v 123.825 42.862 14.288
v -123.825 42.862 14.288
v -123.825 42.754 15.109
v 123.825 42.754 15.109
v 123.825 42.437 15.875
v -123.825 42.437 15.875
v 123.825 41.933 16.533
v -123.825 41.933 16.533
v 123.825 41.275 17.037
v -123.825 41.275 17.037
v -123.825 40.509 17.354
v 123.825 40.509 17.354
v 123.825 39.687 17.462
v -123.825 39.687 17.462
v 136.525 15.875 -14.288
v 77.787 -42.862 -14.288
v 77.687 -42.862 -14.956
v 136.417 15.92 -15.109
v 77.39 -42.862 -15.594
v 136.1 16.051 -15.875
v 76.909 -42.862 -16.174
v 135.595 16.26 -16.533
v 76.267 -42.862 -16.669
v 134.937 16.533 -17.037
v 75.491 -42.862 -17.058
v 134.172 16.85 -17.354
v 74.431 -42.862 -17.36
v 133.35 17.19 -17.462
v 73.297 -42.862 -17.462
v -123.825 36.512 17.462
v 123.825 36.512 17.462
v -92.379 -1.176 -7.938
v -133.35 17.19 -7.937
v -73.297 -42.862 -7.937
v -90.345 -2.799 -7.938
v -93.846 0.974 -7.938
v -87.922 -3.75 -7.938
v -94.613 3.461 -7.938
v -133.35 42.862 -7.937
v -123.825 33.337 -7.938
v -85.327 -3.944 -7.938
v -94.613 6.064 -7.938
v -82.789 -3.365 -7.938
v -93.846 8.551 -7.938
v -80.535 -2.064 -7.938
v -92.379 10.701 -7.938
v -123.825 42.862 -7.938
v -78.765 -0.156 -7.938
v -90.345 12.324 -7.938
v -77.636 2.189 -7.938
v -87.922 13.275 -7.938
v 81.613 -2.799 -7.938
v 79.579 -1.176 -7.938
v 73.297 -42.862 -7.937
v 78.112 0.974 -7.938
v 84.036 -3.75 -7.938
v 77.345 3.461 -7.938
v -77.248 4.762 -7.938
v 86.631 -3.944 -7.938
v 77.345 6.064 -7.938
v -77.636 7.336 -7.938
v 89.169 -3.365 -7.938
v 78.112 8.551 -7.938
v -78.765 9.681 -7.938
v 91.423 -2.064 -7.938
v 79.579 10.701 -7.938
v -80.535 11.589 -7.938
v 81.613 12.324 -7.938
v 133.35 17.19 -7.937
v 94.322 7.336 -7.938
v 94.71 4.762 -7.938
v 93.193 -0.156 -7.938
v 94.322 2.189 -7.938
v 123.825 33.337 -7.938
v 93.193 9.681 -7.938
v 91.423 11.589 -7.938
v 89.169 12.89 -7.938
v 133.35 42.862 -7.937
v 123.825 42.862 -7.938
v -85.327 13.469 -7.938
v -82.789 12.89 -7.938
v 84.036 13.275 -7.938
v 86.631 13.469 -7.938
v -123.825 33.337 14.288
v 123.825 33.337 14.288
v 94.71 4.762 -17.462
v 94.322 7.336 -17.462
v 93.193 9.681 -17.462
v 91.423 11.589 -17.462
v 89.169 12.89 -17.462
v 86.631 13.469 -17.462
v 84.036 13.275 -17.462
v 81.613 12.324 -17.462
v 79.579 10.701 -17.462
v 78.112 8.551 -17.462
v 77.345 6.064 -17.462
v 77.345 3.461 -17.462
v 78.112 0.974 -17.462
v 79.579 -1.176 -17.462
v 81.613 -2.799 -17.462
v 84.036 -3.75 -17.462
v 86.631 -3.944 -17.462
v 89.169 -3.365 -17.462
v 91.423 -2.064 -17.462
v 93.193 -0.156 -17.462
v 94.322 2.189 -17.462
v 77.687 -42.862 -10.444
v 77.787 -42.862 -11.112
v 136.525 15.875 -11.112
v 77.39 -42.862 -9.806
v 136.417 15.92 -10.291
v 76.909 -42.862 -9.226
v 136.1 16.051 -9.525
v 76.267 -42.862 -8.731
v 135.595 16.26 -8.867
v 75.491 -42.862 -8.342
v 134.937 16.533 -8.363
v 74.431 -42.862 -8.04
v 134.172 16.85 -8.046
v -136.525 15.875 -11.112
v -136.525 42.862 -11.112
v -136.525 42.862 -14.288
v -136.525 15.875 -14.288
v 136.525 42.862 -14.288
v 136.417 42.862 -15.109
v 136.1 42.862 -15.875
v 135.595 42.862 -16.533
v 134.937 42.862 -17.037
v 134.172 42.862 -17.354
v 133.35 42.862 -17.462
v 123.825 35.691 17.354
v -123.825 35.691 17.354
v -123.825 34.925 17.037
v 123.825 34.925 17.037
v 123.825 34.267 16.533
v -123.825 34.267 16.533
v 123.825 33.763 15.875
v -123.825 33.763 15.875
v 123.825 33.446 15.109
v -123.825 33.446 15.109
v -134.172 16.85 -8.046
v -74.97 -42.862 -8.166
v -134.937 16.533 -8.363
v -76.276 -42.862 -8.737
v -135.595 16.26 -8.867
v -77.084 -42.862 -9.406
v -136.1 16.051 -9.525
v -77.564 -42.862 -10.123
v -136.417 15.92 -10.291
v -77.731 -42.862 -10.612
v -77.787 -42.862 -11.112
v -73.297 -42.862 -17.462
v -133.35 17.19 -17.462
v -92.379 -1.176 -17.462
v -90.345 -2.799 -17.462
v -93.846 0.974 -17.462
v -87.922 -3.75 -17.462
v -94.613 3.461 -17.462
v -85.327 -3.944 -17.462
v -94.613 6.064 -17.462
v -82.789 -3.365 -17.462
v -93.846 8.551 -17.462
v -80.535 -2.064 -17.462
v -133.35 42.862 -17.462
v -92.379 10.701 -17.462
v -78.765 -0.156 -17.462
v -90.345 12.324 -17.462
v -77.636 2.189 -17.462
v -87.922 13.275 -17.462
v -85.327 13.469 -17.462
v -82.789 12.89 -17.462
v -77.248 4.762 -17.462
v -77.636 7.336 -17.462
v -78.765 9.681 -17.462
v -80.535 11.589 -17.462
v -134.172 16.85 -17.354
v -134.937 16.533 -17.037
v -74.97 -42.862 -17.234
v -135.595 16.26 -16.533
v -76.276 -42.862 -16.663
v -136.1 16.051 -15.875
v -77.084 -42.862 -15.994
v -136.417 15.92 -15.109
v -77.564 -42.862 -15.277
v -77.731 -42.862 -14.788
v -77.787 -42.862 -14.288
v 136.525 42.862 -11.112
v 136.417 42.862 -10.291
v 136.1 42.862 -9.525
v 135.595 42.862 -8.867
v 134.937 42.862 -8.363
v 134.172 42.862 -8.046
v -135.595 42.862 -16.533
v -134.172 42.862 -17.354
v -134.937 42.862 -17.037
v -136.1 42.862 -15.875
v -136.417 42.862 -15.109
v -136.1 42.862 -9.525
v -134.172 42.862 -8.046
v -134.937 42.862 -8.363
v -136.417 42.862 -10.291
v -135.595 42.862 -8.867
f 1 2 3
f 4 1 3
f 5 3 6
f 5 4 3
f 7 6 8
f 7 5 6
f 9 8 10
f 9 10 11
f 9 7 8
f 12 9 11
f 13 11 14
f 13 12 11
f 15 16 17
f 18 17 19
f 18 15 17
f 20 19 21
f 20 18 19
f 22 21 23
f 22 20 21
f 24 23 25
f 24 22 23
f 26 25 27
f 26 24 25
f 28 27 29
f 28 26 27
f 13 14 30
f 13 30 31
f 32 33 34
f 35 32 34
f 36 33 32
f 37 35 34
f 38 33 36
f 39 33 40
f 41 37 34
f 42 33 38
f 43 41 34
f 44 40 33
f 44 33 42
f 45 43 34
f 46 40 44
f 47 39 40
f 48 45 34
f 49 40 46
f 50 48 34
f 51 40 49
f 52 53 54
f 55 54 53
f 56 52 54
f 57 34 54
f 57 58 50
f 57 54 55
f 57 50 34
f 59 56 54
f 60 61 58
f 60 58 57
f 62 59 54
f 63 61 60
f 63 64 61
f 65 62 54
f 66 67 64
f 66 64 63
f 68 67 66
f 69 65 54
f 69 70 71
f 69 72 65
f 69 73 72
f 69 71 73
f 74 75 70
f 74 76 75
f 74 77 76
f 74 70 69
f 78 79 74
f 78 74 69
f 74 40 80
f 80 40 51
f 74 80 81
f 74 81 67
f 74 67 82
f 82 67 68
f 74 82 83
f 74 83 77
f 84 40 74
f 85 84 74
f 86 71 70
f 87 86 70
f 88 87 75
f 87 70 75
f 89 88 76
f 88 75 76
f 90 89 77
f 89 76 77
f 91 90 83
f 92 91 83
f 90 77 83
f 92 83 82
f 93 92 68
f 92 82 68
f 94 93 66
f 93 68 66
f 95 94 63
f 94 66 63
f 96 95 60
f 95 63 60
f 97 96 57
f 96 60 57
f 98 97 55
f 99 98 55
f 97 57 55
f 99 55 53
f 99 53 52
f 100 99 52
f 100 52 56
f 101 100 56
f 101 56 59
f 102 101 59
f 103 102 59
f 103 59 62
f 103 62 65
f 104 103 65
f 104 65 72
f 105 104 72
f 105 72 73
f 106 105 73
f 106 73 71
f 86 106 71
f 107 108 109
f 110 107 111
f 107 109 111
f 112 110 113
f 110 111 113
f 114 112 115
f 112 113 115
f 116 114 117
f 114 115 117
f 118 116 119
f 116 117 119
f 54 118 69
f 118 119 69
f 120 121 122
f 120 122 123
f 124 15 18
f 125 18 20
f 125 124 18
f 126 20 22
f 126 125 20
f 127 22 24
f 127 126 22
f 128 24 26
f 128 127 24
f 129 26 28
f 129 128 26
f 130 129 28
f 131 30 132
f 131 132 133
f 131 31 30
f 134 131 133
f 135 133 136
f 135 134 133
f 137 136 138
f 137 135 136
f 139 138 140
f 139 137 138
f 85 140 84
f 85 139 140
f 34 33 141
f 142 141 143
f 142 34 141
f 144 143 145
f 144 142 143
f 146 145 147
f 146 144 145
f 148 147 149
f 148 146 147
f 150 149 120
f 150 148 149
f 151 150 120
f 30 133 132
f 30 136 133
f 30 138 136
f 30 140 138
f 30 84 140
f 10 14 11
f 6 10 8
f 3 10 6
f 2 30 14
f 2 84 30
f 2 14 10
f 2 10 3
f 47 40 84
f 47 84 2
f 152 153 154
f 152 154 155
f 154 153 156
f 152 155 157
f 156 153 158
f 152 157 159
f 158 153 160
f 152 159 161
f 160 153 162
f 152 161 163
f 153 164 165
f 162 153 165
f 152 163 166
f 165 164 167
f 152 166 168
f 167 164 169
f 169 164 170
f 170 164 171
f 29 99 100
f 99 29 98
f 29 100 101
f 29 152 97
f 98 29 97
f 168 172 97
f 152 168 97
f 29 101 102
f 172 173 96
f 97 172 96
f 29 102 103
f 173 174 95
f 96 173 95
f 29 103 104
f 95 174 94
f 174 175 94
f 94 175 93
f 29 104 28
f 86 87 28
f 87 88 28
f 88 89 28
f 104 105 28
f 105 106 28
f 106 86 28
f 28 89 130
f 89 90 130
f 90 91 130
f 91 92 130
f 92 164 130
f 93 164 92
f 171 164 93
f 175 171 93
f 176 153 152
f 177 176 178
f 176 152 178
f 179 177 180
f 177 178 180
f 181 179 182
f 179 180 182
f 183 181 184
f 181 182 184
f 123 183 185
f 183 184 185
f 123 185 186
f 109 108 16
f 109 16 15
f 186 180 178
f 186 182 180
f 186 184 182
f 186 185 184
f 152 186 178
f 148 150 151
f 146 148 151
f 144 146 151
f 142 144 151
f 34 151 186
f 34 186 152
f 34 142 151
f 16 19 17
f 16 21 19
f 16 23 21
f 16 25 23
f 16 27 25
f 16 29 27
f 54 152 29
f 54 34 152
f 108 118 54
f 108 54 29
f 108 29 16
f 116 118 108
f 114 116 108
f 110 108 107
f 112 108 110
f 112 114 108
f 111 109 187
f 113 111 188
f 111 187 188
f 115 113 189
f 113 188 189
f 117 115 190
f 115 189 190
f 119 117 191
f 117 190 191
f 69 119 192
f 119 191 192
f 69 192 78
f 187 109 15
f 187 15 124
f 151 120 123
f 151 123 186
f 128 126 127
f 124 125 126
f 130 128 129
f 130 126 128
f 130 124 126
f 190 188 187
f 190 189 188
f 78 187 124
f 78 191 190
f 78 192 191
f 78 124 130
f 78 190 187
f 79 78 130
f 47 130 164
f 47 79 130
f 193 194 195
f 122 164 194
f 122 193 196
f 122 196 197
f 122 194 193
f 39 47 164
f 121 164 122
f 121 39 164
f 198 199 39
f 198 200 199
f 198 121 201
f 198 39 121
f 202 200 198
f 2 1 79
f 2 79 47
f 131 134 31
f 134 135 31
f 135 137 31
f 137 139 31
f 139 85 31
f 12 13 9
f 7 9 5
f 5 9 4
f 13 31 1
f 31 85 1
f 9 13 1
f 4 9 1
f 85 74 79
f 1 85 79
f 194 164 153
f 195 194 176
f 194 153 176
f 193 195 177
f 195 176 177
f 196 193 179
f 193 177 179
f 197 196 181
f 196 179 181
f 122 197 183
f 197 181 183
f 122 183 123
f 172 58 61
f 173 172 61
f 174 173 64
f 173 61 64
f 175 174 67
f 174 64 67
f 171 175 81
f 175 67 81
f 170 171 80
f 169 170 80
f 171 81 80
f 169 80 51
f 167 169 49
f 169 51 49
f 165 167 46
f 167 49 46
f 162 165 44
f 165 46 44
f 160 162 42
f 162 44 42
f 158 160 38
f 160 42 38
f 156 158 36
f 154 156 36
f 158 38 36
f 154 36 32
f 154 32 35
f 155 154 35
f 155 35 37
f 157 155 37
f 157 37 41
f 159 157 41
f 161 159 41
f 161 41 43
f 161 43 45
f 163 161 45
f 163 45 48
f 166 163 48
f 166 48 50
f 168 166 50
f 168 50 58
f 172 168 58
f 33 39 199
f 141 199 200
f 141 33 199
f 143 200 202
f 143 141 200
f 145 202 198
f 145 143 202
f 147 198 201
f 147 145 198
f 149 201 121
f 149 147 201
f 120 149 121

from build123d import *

# Parameters (mm, degrees)
BOSS_EXTRUDE1_DEPTH       = 9.525
SKETCH2_W                 = 247.649999748
SKETCH2_H                 = 9.52499999
BOSS_EXTRUDE2_DEPTH       = 25.4
M16_CLEARANCE_HOLE1_D     = 17.462499982
M16_CLEARANCE_HOLE1_DEPTH = 34.925
FILLET1_R                 = 3.175


with BuildPart() as part:
    # Sketch1 → Boss-Extrude1 (new body)
    with BuildSketch(Plane.XY.offset(-7.9375)):
        Polygon((136.524999861, 15.874999984), (136.524999861, 42.862499956), (-136.524999861, 42.862499956), (-136.524999861, 15.874999984), (-77.787499921, -42.862499956), (77.787499921, -42.862499956), align=None)
    extrude(amount=-BOSS_EXTRUDE1_DEPTH)

    # Sketch2 → Boss-Extrude2 (add)
    with BuildSketch(Plane.XY.offset(-7.9375)):
        with Locations((0, 38.099999961)):
            Rectangle(SKETCH2_W, SKETCH2_H)
    extrude(amount=BOSS_EXTRUDE2_DEPTH)

    # M16 Clearance Hole1
    with Locations(Plane(origin=(0, 0, -17.4625), x_dir=(-1, 0, 0), z_dir=(0, 0, -1))):
        with Locations((-85.978999912, 4.762499995), (85.978999912, 4.762499995)):
            Hole(M16_CLEARANCE_HOLE1_D / 2, depth=M16_CLEARANCE_HOLE1_DEPTH)

    # Fillet1
    fillet1_edges = [part.edges().sort_by_distance(p)[0] for p in [
        (-136.524999861, 29.36874997, -17.4625),
        (-107.156249891, -13.493749986, -17.4625),
        (0, 33.337499966, 17.4625),
        (0, 42.862499956, 17.4625),
        (107.156249891, -13.493749986, -17.4625),
        (-107.156249891, -13.493749986, -7.9375),
        (-136.524999861, 29.36874997, -7.9375),
        (136.524999861, 29.36874997, -17.4625),
        (136.524999861, 29.36874997, -7.9375),
        (107.156249891, -13.493749986, -7.9375),
    ]]
    fillet(fillet1_edges, radius=FILLET1_R)


solid = part.part
